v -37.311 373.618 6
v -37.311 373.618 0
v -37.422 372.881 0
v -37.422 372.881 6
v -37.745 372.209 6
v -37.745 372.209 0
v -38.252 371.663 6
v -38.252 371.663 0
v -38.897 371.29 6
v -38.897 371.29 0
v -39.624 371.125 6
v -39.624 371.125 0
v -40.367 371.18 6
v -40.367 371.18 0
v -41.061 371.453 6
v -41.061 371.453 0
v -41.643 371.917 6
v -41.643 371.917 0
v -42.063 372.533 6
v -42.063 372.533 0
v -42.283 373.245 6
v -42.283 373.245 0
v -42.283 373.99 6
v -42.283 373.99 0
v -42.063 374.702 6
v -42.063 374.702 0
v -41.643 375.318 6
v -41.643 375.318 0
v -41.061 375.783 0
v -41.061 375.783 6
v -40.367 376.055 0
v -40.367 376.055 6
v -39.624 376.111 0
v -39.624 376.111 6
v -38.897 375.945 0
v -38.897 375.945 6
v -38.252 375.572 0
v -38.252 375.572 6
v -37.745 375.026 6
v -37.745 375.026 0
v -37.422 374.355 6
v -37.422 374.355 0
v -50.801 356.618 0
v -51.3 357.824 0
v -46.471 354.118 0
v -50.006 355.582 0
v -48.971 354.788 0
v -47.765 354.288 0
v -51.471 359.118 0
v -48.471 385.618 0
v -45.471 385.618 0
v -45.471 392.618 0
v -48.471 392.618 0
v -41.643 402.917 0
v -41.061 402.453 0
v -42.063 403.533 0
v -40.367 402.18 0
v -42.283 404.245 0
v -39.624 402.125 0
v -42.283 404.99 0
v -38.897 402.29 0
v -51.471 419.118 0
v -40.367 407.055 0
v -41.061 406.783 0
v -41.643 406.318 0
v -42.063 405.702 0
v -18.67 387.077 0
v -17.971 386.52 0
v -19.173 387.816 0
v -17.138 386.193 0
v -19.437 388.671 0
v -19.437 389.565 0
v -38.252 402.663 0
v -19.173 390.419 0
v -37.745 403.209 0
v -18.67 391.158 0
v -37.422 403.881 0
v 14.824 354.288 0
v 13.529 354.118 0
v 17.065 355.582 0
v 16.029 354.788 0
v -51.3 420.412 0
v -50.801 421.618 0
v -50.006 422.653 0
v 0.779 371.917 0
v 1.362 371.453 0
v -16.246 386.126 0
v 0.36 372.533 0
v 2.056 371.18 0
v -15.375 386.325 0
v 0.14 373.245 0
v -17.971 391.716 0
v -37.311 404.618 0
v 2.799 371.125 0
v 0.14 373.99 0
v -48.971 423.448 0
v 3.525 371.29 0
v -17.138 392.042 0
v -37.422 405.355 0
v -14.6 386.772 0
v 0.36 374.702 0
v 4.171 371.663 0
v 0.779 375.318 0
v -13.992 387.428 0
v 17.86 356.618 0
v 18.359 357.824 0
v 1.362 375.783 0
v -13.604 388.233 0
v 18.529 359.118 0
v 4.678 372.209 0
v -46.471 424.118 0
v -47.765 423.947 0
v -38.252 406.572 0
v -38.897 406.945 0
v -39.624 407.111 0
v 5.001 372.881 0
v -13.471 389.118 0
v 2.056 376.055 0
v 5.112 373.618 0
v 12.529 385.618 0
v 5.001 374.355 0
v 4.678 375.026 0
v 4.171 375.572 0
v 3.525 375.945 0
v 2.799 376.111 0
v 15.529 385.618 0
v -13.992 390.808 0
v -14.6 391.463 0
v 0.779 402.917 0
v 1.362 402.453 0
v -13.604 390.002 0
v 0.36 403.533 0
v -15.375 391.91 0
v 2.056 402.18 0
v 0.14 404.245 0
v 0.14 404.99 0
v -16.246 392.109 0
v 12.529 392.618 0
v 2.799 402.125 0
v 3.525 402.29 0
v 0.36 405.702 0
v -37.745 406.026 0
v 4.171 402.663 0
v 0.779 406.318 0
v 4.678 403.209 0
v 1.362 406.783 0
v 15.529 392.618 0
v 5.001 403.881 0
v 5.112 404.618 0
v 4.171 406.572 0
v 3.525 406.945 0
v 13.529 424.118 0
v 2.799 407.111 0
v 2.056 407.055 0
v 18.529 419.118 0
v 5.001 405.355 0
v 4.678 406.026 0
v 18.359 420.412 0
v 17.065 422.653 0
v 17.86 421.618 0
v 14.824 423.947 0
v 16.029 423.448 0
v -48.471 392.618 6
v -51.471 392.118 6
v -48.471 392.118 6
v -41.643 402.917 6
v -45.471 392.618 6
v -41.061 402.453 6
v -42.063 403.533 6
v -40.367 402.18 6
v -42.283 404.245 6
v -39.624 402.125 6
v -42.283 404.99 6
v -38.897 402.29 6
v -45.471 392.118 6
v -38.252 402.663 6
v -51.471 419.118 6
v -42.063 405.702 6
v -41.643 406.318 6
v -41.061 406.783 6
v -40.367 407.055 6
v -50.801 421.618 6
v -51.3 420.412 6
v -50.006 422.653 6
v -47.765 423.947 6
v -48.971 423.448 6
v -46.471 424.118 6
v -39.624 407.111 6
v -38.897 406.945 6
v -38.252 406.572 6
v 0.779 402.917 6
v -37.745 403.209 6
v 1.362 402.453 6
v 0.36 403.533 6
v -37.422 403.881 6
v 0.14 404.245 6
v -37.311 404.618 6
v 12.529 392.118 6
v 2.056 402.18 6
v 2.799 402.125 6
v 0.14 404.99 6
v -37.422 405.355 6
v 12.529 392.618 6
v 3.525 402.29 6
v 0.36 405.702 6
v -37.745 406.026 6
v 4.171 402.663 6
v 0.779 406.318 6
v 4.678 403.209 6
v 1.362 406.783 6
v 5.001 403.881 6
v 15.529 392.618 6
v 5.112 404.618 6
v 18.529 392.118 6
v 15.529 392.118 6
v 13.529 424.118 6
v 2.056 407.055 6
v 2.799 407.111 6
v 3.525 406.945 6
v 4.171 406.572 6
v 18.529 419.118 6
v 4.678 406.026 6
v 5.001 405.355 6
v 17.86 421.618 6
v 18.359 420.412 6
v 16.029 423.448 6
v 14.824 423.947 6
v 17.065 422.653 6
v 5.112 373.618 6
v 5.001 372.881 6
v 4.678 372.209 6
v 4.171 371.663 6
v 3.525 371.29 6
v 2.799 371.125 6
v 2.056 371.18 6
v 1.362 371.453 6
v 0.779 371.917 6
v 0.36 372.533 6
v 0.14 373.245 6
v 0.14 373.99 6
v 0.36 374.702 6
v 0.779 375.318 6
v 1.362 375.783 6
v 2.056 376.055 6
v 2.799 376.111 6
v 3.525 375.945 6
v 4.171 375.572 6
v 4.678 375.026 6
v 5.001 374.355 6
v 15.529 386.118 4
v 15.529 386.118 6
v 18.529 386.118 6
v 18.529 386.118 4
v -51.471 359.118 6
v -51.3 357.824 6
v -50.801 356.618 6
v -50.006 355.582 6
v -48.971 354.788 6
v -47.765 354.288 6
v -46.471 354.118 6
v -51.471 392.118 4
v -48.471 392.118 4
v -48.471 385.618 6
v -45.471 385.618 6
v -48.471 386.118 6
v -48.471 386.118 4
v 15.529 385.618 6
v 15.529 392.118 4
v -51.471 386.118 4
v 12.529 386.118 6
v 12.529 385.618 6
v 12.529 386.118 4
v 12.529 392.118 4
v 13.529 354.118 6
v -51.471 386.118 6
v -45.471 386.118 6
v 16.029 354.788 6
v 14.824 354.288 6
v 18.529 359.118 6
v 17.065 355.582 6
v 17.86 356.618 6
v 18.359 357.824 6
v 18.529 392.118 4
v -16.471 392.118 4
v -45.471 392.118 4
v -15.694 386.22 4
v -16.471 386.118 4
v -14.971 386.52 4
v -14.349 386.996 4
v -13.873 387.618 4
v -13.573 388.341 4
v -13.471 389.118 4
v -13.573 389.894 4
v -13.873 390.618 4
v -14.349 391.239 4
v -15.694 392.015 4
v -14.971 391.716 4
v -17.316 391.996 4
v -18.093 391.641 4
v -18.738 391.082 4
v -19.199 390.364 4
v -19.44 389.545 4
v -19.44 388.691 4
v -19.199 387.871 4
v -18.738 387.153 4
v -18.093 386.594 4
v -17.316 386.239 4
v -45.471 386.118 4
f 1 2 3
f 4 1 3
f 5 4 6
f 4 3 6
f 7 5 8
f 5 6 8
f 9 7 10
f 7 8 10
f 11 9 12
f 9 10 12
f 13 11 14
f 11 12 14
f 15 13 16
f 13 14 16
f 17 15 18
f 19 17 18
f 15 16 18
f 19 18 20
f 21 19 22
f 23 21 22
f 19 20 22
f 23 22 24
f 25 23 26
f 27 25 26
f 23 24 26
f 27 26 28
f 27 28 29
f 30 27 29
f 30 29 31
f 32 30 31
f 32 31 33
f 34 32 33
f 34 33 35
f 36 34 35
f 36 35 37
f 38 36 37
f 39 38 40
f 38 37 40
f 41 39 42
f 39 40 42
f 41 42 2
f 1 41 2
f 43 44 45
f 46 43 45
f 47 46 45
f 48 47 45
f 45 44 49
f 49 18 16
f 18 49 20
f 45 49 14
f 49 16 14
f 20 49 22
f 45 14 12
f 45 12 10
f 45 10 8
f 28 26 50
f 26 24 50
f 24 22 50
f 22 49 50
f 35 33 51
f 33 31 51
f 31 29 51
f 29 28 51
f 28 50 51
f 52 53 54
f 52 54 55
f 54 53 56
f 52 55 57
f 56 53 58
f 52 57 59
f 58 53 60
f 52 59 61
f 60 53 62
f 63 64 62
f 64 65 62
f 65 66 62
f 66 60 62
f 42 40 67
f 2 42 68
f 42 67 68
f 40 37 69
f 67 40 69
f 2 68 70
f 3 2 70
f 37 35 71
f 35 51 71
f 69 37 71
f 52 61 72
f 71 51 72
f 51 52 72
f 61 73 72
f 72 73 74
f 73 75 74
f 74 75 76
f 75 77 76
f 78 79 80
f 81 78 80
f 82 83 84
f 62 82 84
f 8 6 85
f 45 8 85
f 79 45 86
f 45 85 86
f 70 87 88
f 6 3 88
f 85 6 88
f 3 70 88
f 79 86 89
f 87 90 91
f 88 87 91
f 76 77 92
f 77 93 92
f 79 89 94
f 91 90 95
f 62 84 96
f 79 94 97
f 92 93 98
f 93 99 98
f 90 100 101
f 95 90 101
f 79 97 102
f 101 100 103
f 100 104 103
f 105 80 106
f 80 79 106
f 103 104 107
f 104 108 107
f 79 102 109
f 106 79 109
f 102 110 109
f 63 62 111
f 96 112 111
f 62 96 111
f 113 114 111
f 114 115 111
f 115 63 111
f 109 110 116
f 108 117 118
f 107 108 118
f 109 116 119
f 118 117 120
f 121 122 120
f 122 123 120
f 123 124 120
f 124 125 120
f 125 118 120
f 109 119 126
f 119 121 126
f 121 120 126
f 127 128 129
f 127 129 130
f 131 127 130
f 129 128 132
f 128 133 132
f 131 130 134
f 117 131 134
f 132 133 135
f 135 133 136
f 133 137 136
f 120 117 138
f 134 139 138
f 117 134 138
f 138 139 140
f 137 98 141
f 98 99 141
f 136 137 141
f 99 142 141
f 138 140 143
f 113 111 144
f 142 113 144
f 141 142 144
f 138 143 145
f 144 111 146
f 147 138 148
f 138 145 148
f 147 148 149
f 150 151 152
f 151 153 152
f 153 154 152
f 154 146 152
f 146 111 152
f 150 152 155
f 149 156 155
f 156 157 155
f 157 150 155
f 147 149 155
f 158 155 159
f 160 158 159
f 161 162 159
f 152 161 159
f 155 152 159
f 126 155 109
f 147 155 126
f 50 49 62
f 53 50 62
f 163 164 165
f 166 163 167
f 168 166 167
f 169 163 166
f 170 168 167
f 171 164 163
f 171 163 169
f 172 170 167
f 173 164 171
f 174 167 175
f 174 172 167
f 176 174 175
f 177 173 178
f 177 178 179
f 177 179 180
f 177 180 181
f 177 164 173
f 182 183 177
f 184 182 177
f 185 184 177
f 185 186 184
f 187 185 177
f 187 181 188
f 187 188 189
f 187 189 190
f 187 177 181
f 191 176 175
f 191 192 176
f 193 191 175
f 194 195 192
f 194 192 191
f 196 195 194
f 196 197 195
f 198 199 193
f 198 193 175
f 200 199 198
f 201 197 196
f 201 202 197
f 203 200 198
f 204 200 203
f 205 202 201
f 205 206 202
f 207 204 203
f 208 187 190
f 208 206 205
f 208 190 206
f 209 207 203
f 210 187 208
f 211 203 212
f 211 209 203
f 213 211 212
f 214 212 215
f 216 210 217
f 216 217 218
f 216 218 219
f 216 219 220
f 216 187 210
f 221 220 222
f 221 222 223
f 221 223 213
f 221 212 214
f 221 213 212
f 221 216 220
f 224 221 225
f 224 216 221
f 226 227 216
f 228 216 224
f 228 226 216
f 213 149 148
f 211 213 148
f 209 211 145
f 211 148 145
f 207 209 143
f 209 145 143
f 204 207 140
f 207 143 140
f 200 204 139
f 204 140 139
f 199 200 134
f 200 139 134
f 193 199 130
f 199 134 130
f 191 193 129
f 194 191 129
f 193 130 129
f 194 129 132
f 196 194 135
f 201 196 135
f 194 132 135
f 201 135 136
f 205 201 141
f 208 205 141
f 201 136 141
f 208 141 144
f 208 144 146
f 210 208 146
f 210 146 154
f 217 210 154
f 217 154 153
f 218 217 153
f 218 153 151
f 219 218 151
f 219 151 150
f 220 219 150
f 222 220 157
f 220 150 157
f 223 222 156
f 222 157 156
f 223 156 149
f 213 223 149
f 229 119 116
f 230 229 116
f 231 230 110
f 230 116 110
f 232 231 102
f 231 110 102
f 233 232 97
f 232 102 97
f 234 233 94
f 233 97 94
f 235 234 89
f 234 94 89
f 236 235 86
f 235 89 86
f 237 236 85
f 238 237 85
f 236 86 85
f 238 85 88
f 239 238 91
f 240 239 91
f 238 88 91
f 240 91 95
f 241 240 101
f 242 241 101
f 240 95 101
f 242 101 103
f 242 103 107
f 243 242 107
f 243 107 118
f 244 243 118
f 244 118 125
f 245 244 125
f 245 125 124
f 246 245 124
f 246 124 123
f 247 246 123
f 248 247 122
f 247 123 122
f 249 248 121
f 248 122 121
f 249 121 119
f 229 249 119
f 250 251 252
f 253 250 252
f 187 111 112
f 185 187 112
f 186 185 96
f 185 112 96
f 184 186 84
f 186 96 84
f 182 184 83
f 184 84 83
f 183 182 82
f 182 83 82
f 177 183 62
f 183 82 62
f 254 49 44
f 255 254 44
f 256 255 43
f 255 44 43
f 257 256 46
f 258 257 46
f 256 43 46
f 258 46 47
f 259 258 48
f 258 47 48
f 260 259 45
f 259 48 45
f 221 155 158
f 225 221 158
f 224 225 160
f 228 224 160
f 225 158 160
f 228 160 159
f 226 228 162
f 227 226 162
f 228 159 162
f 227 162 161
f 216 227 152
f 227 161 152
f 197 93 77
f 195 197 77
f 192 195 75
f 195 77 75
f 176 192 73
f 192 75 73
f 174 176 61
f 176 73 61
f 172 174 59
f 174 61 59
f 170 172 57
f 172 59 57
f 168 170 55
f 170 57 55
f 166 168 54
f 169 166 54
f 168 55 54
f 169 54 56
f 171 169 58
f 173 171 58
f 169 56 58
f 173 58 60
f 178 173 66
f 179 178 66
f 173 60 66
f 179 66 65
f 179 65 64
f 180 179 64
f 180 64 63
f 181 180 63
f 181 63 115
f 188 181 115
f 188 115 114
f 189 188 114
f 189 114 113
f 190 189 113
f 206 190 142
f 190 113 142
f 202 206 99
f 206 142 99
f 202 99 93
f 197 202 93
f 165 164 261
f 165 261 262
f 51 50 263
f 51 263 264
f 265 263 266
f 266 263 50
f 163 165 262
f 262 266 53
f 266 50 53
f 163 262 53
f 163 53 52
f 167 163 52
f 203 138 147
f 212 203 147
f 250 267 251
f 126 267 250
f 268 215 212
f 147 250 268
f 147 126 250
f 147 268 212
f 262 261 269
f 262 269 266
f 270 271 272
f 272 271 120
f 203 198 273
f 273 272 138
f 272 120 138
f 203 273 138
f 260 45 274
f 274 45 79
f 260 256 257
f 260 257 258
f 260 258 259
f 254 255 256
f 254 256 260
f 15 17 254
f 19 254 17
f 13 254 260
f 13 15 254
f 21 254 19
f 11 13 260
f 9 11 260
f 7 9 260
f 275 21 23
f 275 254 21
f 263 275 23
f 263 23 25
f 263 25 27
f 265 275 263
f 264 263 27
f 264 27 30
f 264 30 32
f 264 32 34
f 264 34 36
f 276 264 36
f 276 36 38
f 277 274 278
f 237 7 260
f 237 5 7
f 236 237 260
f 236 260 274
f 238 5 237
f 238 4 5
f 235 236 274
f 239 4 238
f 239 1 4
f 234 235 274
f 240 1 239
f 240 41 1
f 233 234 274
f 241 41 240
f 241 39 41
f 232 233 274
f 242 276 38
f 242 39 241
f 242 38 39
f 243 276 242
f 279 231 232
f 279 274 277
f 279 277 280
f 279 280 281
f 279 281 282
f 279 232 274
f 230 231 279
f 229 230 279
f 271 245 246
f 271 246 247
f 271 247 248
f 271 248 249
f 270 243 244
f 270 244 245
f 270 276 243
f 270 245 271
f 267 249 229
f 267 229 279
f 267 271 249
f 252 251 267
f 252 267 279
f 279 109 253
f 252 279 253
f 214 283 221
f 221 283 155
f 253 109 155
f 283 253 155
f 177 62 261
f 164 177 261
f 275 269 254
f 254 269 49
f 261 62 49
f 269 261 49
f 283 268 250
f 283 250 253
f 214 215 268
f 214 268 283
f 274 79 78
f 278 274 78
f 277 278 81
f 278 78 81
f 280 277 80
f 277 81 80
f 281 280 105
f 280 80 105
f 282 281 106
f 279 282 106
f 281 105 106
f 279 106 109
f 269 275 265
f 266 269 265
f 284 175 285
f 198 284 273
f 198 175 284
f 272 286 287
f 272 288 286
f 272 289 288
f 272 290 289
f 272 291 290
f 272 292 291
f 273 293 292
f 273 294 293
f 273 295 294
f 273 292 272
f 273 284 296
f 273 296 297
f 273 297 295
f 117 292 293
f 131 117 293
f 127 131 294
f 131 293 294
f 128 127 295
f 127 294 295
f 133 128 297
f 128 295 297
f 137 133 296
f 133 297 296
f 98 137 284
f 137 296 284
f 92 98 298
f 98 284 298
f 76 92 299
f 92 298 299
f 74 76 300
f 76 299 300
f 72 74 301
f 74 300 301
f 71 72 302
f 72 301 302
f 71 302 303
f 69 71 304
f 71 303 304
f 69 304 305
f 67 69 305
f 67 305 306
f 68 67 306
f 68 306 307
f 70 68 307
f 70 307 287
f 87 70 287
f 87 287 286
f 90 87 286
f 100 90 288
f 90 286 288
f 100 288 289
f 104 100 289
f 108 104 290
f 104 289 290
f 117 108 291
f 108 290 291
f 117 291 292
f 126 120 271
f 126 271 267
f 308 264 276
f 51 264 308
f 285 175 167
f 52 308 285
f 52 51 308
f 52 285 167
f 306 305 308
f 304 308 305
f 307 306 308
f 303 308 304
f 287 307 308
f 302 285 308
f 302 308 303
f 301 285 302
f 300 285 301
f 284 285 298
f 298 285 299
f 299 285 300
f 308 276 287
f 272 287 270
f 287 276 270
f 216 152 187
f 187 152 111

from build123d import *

# Parameters (mm, degrees)
SKETCH1_W           = 3
SKETCH1_H           = 7
BOSS_EXTRUDE1_DEPTH = 6
SKETCH5_W           = 70
SKETCH5_H           = 6
CUT_EXTRUDE2_DEPTH  = 2
SKETCH6_R           = 3
CUT_EXTRUDE3_DEPTH  = 10


with BuildPart() as part:
    # Sketch1 → Boss-Extrude1 (new body)
    # profile 1 of 3: a face of its own
    with BuildSketch(Plane.XY):
        with BuildLine():
            ThreePointArc((0.112083698, 404.617647059), (2.612083698, 407.117647059), (5.112083698, 404.617647059))
            Line((5.112083698, 404.617647059), (18.529411765, 404.617647059))
            Line((18.529411765, 404.617647059), (18.529411765, 419.117647059))
            ThreePointArc((18.529411765, 419.117647059), (17.064945671, 422.653180965), (13.529411765, 424.117647059))
            Line((13.529411765, 424.117647059), (-46.470588235, 424.117647059))
            ThreePointArc((-46.470588235, 424.117647059), (-50.006122141, 422.653180965), (-51.470588235, 419.117647059))
            Line((-51.470588235, 419.117647059), (-51.470588235, 404.617647059))
            Line((-51.470588235, 404.617647059), (-42.310598324, 404.617647059))
            ThreePointArc((-42.310598324, 404.617647059), (-39.810598324, 407.117647059), (-37.310598324, 404.617647059))
            Line((-37.310598324, 404.617647059), (0.112083698, 404.617647059))
        make_face()
    # profile 2 of 3: a face of its own
    with BuildSketch(Plane.XY):
        with BuildLine():
            Line((18.529411765, 404.617647059), (5.112083698, 404.617647059))
            ThreePointArc((5.112083698, 404.617647059), (2.612083698, 402.117647059), (0.112083698, 404.617647059))
            Line((0.112083698, 404.617647059), (-37.310598324, 404.617647059))
            ThreePointArc((-37.310598324, 404.617647059), (-39.810598324, 402.117647059), (-42.310598324, 404.617647059))
            Line((-42.310598324, 404.617647059), (-51.470588235, 404.617647059))
            Line((-51.470588235, 404.617647059), (-51.470588235, 373.617647059))
            Line((-51.470588235, 373.617647059), (-42.310598324, 373.617647059))
            ThreePointArc((-42.310598324, 373.617647059), (-39.810598324, 376.117647059), (-37.310598324, 373.617647059))
            Line((-37.310598324, 373.617647059), (0.112083698, 373.617647059))
            ThreePointArc((0.112083698, 373.617647059), (2.612083698, 376.117647059), (5.112083698, 373.617647059))
            Line((5.112083698, 373.617647059), (18.529411765, 373.617647059))
            Line((18.529411765, 373.617647059), (18.529411765, 404.617647059))
        make_face()
        with Locations((-46.970588235, 389.117647059)):
            Rectangle(SKETCH1_W, SKETCH1_H, mode=Mode.SUBTRACT)
        with Locations((14.029411765, 389.117647059)):
            Rectangle(SKETCH1_W, SKETCH1_H, mode=Mode.SUBTRACT)
    # profile 3 of 3: a face of its own
    with BuildSketch(Plane.XY):
        with BuildLine():
            Line((18.529411765, 359.117647059), (18.529411765, 373.617647059))
            Line((18.529411765, 373.617647059), (5.112083698, 373.617647059))
            ThreePointArc((5.112083698, 373.617647059), (2.612083698, 371.117647059), (0.112083698, 373.617647059))
            Line((0.112083698, 373.617647059), (-37.310598324, 373.617647059))
            ThreePointArc((-37.310598324, 373.617647059), (-39.810598324, 371.117647059), (-42.310598324, 373.617647059))
            Line((-42.310598324, 373.617647059), (-51.470588235, 373.617647059))
            Line((-51.470588235, 373.617647059), (-51.470588235, 359.117647059))
            ThreePointArc((-51.470588235, 359.117647059), (-50.006122141, 355.582113153), (-46.470588235, 354.117647059))
            Line((-46.470588235, 354.117647059), (13.529411765, 354.117647059))
            ThreePointArc((13.529411765, 354.117647059), (17.064945671, 355.582113153), (18.529411765, 359.117647059))
        make_face()
    extrude(amount=BOSS_EXTRUDE1_DEPTH)

    # Sketch5 → Cut-Extrude2 (cut)
    with BuildSketch(Plane.XY.offset(6)):
        with Locations((-16.470588235, 389.117647059)):
            Rectangle(SKETCH5_W, SKETCH5_H)
    extrude(amount=-CUT_EXTRUDE2_DEPTH, mode=Mode.SUBTRACT)

    # Sketch6 → Cut-Extrude3 (cut)
    with BuildSketch(Plane.XY.offset(4)):
        with Locations((-16.470588235, 389.117647059)):
            Circle(SKETCH6_R)
    extrude(amount=-CUT_EXTRUDE3_DEPTH, mode=Mode.SUBTRACT)


solid = part.part
